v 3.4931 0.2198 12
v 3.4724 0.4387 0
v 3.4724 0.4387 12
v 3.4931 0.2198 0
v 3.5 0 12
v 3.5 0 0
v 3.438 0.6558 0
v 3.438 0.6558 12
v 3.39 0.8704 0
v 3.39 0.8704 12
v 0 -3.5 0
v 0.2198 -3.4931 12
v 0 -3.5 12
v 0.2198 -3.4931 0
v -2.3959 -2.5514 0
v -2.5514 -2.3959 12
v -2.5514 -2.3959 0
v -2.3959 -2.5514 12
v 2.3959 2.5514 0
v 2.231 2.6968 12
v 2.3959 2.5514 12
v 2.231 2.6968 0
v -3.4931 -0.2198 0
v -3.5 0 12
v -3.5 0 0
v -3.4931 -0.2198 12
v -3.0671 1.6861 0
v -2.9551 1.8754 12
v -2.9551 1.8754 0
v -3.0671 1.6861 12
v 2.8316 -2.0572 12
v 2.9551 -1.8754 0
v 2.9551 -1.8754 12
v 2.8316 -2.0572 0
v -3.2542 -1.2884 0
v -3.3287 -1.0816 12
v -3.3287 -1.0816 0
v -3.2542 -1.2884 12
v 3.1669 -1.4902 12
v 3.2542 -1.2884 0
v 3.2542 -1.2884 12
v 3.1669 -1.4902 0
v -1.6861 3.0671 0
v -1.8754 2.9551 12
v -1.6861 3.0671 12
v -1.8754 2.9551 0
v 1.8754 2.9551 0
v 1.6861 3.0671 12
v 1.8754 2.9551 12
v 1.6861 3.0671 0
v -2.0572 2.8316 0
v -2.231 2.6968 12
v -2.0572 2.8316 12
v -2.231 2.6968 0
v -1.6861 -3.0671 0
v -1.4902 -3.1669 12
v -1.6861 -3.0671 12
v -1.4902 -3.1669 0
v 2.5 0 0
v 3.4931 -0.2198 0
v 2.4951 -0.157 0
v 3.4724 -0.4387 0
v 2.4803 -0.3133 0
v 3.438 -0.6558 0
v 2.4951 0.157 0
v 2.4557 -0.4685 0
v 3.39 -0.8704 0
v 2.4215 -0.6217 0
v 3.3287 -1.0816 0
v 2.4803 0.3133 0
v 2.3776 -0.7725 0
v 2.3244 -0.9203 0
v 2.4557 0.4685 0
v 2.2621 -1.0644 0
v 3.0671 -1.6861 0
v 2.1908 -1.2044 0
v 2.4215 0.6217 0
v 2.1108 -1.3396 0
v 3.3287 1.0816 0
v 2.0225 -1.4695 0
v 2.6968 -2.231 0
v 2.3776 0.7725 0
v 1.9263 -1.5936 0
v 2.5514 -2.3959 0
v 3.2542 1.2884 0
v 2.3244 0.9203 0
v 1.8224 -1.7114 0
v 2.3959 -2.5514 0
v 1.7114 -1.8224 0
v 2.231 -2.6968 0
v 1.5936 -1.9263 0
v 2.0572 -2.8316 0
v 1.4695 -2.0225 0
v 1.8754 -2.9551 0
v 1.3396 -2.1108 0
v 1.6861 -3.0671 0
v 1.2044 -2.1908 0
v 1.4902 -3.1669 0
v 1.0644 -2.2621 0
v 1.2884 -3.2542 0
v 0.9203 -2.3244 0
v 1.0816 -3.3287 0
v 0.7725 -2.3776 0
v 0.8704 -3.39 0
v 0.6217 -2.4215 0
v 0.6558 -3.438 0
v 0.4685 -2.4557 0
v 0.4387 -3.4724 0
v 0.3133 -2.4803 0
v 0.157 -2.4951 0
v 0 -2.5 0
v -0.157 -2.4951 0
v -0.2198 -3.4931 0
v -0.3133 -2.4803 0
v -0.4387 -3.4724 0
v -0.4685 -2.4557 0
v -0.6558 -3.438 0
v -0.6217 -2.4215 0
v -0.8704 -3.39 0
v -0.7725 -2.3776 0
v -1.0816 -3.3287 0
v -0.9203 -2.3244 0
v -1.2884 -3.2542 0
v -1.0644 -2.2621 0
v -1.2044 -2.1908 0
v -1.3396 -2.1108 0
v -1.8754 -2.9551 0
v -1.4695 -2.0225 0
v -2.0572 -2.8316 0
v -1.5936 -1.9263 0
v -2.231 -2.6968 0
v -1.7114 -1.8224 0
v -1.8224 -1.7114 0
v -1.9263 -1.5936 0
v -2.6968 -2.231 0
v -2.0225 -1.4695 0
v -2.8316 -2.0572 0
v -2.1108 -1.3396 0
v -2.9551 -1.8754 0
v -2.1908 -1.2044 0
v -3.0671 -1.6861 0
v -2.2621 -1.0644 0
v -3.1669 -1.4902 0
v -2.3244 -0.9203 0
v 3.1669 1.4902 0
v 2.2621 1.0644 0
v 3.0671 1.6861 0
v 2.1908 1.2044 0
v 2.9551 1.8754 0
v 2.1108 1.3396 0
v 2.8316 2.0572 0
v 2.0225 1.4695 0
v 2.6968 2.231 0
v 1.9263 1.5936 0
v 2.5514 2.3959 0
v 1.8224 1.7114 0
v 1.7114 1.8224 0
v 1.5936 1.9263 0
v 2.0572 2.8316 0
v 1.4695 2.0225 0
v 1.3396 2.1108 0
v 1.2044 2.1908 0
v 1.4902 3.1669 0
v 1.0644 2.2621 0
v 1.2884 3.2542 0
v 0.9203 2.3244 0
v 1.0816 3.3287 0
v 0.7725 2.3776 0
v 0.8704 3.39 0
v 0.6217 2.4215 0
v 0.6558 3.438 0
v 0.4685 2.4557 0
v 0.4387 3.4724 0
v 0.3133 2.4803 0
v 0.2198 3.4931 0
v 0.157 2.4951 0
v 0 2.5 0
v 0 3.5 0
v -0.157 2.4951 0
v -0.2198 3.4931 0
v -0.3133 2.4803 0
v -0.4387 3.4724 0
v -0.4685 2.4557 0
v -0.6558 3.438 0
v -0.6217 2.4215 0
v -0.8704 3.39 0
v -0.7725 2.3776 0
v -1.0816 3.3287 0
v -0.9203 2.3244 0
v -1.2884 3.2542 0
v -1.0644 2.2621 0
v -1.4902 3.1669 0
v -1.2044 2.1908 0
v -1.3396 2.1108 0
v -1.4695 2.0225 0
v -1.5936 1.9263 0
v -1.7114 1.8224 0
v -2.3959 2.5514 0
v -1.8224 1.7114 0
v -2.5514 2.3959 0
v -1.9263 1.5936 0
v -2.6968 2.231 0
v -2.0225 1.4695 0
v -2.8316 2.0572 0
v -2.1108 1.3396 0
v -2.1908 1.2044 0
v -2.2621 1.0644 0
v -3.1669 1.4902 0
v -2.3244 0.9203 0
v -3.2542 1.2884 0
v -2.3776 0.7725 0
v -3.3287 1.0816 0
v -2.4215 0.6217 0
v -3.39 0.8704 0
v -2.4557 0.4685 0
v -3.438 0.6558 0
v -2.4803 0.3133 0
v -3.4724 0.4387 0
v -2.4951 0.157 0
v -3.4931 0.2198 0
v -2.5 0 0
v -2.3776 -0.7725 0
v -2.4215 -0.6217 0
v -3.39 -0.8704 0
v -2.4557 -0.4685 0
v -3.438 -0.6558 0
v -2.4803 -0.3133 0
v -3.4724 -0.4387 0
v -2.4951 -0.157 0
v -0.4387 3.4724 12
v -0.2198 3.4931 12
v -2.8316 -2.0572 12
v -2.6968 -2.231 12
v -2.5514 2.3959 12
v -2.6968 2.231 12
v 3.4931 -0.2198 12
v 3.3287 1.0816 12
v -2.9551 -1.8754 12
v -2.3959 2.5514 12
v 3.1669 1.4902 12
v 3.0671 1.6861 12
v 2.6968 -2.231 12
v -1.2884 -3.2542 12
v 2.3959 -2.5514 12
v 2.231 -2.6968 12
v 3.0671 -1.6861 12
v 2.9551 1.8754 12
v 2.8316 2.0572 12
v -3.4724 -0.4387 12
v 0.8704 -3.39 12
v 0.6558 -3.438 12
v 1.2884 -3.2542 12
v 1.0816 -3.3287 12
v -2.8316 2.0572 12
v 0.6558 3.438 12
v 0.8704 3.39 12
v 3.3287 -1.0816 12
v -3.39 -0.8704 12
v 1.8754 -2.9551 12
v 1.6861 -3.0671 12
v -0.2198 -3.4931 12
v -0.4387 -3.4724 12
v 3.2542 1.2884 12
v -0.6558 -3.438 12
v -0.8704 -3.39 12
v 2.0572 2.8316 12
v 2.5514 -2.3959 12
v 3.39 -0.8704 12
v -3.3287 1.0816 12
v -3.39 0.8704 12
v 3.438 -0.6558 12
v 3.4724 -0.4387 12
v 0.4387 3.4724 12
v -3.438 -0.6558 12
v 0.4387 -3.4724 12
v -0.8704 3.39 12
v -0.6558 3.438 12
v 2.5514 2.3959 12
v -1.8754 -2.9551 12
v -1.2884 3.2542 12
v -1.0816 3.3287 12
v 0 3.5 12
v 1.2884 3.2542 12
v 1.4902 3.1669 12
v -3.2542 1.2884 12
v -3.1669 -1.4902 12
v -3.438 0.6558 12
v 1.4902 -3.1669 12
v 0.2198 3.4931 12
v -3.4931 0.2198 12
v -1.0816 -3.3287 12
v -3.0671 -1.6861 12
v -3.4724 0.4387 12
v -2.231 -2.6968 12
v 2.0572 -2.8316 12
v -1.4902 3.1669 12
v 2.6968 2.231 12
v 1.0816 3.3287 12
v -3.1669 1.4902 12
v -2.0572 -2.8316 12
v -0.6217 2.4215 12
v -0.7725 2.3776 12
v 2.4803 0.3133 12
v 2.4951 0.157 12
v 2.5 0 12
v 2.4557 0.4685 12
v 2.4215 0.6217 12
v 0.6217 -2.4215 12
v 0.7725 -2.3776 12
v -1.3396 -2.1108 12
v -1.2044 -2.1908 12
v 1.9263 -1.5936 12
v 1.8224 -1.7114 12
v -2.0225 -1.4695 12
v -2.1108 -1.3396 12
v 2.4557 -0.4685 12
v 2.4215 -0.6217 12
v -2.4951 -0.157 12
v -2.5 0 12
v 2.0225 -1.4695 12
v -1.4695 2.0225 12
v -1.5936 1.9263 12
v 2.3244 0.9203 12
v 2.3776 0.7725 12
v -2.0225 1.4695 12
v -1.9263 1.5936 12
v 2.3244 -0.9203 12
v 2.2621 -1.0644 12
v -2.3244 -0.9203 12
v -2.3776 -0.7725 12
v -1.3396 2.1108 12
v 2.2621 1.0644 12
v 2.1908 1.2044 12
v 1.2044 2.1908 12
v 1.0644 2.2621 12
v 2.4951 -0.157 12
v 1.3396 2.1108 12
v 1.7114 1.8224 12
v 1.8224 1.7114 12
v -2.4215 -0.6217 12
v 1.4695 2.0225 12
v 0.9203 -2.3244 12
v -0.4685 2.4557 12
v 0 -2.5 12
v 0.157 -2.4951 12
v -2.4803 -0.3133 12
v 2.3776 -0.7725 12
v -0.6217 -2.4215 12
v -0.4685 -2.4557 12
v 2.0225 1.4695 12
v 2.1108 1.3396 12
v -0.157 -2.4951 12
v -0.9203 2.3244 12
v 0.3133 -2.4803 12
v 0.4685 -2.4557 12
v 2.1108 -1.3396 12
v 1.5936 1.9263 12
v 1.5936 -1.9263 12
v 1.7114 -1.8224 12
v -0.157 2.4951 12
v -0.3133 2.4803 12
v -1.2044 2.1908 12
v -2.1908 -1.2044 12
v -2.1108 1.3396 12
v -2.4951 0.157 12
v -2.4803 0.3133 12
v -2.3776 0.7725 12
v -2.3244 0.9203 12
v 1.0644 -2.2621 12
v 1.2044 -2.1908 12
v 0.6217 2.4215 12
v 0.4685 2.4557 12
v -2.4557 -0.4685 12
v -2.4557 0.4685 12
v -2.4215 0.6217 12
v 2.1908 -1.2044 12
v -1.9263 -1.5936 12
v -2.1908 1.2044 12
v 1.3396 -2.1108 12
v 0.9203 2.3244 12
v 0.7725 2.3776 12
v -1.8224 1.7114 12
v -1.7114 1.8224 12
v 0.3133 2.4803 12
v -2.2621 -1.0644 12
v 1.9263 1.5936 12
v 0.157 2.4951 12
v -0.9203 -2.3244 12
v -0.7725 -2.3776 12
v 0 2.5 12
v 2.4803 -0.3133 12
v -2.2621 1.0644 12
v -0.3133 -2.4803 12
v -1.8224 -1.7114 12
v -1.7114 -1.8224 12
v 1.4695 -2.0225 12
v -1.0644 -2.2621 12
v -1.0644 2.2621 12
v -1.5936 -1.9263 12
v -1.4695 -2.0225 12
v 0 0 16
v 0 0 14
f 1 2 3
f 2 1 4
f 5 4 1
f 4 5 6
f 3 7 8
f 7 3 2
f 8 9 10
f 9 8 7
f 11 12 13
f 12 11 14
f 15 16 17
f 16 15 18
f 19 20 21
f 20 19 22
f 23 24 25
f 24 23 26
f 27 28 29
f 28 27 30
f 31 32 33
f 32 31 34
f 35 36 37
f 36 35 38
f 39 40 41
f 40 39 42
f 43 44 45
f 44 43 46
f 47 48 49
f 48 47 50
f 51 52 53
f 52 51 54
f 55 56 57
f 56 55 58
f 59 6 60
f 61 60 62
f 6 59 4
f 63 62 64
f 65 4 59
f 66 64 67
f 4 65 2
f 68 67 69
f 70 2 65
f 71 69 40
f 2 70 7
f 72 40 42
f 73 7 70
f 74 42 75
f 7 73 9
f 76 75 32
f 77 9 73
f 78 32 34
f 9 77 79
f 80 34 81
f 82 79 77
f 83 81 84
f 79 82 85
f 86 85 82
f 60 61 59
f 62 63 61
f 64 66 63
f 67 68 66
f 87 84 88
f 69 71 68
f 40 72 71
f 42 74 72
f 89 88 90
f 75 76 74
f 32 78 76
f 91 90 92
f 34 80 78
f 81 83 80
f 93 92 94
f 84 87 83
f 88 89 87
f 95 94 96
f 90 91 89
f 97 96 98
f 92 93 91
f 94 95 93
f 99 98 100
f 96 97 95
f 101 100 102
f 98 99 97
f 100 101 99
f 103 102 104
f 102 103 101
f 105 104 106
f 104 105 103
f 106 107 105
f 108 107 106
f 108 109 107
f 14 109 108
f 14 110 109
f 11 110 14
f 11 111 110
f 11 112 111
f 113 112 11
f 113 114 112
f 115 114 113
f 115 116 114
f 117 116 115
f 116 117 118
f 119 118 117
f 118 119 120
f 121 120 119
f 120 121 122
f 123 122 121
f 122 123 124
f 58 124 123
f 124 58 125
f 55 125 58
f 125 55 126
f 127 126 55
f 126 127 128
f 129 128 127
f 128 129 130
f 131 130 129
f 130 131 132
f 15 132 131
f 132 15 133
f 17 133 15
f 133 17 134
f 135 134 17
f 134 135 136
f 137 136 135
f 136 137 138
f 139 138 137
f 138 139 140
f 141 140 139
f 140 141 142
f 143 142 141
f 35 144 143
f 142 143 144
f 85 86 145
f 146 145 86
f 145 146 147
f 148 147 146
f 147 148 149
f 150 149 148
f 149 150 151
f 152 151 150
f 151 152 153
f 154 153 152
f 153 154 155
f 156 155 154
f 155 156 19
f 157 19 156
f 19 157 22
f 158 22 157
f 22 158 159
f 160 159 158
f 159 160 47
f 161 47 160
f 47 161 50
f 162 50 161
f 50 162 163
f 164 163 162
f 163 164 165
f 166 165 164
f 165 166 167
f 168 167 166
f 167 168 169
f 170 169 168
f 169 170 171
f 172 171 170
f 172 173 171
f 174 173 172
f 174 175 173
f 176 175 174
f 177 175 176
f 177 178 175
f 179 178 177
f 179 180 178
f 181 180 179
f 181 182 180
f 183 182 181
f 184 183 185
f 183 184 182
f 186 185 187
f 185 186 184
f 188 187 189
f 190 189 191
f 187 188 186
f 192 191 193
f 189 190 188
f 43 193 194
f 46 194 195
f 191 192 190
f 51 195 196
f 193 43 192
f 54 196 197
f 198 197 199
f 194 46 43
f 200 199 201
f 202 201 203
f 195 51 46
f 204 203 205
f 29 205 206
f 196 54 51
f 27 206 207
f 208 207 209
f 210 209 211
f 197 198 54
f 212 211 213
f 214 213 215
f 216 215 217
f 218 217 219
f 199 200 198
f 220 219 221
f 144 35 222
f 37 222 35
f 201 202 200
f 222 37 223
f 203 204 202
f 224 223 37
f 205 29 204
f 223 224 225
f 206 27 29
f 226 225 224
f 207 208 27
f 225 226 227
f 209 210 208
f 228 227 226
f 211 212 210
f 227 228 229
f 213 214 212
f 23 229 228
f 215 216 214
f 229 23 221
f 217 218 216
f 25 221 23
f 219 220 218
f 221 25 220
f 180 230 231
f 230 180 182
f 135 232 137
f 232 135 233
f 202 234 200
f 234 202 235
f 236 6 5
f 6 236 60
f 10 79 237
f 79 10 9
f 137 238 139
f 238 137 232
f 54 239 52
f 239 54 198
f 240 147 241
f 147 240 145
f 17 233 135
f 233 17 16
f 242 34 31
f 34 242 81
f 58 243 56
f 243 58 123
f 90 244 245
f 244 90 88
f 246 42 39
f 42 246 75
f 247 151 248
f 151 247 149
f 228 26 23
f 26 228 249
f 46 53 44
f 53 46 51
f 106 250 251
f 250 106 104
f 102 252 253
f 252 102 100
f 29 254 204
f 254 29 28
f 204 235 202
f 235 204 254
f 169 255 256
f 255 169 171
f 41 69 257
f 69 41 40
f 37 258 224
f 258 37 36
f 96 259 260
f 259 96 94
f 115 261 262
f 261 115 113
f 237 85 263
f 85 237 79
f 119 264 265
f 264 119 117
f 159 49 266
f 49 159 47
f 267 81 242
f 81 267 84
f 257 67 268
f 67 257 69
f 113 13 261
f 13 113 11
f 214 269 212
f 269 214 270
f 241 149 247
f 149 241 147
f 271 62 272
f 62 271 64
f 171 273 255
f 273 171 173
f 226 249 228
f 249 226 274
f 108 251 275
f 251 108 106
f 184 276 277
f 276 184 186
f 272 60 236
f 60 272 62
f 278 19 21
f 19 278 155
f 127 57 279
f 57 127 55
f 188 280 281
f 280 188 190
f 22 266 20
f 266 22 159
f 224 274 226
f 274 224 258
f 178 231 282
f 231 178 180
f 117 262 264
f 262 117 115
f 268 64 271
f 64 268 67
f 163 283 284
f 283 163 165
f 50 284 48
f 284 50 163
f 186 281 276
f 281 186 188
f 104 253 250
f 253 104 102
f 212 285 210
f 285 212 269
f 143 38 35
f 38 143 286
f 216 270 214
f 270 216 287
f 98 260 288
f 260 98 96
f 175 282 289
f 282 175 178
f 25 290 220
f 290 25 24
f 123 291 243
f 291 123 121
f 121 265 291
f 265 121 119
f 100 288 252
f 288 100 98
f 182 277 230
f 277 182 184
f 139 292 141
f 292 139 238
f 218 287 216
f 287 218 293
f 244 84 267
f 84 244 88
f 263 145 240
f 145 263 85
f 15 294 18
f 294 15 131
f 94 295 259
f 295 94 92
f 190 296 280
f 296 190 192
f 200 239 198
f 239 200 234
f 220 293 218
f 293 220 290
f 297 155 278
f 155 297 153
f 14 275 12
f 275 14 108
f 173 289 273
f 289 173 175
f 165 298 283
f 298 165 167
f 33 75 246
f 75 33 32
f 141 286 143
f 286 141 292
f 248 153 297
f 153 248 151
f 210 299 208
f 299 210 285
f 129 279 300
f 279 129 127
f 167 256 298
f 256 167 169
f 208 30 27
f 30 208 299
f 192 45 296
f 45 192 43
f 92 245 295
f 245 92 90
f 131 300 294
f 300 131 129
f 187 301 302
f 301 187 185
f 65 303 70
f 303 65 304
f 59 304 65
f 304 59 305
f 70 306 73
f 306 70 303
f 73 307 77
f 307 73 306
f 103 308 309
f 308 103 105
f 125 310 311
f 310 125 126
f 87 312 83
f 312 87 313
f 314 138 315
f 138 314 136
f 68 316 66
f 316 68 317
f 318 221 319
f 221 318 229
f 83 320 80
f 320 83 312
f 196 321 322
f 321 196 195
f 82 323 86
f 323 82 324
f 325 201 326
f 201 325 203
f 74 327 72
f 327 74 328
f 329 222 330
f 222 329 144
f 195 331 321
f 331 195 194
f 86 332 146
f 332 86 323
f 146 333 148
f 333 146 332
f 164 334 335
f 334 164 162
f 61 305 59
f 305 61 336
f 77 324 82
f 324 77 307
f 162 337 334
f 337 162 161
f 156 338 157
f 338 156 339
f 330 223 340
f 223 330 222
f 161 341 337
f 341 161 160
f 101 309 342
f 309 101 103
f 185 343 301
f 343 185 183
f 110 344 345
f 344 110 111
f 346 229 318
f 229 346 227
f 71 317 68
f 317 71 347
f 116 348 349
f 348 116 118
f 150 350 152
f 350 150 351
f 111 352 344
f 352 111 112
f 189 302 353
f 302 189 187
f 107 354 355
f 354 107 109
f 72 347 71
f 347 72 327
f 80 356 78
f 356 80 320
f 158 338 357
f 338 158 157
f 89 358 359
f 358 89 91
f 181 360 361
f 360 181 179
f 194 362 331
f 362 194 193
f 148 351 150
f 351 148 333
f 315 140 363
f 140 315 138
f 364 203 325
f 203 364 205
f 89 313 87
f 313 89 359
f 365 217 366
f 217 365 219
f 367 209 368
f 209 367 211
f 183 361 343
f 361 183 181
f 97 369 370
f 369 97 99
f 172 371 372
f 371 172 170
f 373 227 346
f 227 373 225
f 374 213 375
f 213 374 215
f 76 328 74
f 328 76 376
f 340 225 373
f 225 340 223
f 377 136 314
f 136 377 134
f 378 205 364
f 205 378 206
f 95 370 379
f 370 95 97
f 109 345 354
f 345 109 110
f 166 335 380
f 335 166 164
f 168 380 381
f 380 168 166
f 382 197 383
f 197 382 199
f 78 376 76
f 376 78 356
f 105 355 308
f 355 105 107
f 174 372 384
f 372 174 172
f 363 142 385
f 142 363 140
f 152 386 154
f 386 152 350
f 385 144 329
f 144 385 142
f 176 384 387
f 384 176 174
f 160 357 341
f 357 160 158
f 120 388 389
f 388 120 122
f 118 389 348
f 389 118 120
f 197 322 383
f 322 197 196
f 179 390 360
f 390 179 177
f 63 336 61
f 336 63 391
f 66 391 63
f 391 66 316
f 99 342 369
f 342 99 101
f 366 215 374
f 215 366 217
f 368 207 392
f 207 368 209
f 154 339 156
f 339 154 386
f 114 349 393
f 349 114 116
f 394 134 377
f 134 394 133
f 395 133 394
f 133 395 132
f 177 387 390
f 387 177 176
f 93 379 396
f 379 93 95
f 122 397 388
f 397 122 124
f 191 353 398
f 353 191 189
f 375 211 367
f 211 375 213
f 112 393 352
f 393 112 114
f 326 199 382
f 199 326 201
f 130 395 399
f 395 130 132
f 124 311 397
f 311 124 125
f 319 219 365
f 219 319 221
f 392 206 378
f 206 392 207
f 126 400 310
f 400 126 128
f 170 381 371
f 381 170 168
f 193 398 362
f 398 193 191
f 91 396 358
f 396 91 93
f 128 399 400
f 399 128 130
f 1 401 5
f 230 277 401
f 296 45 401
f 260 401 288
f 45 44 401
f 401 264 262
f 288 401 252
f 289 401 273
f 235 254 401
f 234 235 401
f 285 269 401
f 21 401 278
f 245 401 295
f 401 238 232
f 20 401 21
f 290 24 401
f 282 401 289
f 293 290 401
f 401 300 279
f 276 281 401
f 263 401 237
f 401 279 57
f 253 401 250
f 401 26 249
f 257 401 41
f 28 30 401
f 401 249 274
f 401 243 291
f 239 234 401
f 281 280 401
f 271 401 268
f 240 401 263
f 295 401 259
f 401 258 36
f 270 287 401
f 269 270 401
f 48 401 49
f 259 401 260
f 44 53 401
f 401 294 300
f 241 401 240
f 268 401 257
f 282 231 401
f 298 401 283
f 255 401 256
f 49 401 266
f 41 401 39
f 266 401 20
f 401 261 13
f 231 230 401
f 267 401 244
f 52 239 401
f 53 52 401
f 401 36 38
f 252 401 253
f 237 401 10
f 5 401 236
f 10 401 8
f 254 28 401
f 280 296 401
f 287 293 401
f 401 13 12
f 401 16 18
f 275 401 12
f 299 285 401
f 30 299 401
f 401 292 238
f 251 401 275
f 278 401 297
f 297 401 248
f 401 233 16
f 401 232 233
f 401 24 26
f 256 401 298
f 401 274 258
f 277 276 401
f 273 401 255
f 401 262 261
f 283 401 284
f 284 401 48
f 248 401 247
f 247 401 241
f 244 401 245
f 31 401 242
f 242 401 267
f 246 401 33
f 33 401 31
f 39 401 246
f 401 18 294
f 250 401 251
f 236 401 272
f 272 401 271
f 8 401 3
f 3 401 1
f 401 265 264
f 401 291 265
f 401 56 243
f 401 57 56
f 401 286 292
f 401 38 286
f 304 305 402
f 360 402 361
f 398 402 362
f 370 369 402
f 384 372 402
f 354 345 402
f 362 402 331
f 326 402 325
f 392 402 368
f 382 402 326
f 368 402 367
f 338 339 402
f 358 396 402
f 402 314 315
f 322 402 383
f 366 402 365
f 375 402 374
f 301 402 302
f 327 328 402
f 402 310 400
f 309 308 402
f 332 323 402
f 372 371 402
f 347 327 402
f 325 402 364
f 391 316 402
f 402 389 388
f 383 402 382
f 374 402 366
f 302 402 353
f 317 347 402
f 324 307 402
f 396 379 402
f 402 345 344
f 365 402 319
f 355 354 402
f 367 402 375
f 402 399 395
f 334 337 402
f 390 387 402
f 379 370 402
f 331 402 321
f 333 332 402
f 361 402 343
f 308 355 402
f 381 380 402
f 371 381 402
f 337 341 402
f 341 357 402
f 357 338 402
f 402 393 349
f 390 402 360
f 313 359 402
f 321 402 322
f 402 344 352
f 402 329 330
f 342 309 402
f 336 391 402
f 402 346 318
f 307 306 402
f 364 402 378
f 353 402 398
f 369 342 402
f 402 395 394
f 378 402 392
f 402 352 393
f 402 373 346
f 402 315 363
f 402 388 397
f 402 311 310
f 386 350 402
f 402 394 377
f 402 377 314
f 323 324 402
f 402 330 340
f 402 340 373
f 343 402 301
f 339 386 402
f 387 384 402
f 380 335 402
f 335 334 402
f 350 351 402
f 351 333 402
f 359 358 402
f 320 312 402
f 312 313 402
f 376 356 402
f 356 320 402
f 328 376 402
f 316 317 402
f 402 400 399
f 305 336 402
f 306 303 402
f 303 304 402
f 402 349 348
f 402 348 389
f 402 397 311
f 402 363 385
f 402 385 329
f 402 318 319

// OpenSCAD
difference()
{
    cylinder(d=7,h=12, $fn=100);
    translate([0,0,0]) cylinder(d=5,h=12,$fn=100);
}

difference()
{
translate([0,0,12]) cylinder(d1=7,d2=0,h=4, $fn=100);
translate([0,0,12]) cylinder(d1=5,d2=0,h=2, $fn=100);
}
